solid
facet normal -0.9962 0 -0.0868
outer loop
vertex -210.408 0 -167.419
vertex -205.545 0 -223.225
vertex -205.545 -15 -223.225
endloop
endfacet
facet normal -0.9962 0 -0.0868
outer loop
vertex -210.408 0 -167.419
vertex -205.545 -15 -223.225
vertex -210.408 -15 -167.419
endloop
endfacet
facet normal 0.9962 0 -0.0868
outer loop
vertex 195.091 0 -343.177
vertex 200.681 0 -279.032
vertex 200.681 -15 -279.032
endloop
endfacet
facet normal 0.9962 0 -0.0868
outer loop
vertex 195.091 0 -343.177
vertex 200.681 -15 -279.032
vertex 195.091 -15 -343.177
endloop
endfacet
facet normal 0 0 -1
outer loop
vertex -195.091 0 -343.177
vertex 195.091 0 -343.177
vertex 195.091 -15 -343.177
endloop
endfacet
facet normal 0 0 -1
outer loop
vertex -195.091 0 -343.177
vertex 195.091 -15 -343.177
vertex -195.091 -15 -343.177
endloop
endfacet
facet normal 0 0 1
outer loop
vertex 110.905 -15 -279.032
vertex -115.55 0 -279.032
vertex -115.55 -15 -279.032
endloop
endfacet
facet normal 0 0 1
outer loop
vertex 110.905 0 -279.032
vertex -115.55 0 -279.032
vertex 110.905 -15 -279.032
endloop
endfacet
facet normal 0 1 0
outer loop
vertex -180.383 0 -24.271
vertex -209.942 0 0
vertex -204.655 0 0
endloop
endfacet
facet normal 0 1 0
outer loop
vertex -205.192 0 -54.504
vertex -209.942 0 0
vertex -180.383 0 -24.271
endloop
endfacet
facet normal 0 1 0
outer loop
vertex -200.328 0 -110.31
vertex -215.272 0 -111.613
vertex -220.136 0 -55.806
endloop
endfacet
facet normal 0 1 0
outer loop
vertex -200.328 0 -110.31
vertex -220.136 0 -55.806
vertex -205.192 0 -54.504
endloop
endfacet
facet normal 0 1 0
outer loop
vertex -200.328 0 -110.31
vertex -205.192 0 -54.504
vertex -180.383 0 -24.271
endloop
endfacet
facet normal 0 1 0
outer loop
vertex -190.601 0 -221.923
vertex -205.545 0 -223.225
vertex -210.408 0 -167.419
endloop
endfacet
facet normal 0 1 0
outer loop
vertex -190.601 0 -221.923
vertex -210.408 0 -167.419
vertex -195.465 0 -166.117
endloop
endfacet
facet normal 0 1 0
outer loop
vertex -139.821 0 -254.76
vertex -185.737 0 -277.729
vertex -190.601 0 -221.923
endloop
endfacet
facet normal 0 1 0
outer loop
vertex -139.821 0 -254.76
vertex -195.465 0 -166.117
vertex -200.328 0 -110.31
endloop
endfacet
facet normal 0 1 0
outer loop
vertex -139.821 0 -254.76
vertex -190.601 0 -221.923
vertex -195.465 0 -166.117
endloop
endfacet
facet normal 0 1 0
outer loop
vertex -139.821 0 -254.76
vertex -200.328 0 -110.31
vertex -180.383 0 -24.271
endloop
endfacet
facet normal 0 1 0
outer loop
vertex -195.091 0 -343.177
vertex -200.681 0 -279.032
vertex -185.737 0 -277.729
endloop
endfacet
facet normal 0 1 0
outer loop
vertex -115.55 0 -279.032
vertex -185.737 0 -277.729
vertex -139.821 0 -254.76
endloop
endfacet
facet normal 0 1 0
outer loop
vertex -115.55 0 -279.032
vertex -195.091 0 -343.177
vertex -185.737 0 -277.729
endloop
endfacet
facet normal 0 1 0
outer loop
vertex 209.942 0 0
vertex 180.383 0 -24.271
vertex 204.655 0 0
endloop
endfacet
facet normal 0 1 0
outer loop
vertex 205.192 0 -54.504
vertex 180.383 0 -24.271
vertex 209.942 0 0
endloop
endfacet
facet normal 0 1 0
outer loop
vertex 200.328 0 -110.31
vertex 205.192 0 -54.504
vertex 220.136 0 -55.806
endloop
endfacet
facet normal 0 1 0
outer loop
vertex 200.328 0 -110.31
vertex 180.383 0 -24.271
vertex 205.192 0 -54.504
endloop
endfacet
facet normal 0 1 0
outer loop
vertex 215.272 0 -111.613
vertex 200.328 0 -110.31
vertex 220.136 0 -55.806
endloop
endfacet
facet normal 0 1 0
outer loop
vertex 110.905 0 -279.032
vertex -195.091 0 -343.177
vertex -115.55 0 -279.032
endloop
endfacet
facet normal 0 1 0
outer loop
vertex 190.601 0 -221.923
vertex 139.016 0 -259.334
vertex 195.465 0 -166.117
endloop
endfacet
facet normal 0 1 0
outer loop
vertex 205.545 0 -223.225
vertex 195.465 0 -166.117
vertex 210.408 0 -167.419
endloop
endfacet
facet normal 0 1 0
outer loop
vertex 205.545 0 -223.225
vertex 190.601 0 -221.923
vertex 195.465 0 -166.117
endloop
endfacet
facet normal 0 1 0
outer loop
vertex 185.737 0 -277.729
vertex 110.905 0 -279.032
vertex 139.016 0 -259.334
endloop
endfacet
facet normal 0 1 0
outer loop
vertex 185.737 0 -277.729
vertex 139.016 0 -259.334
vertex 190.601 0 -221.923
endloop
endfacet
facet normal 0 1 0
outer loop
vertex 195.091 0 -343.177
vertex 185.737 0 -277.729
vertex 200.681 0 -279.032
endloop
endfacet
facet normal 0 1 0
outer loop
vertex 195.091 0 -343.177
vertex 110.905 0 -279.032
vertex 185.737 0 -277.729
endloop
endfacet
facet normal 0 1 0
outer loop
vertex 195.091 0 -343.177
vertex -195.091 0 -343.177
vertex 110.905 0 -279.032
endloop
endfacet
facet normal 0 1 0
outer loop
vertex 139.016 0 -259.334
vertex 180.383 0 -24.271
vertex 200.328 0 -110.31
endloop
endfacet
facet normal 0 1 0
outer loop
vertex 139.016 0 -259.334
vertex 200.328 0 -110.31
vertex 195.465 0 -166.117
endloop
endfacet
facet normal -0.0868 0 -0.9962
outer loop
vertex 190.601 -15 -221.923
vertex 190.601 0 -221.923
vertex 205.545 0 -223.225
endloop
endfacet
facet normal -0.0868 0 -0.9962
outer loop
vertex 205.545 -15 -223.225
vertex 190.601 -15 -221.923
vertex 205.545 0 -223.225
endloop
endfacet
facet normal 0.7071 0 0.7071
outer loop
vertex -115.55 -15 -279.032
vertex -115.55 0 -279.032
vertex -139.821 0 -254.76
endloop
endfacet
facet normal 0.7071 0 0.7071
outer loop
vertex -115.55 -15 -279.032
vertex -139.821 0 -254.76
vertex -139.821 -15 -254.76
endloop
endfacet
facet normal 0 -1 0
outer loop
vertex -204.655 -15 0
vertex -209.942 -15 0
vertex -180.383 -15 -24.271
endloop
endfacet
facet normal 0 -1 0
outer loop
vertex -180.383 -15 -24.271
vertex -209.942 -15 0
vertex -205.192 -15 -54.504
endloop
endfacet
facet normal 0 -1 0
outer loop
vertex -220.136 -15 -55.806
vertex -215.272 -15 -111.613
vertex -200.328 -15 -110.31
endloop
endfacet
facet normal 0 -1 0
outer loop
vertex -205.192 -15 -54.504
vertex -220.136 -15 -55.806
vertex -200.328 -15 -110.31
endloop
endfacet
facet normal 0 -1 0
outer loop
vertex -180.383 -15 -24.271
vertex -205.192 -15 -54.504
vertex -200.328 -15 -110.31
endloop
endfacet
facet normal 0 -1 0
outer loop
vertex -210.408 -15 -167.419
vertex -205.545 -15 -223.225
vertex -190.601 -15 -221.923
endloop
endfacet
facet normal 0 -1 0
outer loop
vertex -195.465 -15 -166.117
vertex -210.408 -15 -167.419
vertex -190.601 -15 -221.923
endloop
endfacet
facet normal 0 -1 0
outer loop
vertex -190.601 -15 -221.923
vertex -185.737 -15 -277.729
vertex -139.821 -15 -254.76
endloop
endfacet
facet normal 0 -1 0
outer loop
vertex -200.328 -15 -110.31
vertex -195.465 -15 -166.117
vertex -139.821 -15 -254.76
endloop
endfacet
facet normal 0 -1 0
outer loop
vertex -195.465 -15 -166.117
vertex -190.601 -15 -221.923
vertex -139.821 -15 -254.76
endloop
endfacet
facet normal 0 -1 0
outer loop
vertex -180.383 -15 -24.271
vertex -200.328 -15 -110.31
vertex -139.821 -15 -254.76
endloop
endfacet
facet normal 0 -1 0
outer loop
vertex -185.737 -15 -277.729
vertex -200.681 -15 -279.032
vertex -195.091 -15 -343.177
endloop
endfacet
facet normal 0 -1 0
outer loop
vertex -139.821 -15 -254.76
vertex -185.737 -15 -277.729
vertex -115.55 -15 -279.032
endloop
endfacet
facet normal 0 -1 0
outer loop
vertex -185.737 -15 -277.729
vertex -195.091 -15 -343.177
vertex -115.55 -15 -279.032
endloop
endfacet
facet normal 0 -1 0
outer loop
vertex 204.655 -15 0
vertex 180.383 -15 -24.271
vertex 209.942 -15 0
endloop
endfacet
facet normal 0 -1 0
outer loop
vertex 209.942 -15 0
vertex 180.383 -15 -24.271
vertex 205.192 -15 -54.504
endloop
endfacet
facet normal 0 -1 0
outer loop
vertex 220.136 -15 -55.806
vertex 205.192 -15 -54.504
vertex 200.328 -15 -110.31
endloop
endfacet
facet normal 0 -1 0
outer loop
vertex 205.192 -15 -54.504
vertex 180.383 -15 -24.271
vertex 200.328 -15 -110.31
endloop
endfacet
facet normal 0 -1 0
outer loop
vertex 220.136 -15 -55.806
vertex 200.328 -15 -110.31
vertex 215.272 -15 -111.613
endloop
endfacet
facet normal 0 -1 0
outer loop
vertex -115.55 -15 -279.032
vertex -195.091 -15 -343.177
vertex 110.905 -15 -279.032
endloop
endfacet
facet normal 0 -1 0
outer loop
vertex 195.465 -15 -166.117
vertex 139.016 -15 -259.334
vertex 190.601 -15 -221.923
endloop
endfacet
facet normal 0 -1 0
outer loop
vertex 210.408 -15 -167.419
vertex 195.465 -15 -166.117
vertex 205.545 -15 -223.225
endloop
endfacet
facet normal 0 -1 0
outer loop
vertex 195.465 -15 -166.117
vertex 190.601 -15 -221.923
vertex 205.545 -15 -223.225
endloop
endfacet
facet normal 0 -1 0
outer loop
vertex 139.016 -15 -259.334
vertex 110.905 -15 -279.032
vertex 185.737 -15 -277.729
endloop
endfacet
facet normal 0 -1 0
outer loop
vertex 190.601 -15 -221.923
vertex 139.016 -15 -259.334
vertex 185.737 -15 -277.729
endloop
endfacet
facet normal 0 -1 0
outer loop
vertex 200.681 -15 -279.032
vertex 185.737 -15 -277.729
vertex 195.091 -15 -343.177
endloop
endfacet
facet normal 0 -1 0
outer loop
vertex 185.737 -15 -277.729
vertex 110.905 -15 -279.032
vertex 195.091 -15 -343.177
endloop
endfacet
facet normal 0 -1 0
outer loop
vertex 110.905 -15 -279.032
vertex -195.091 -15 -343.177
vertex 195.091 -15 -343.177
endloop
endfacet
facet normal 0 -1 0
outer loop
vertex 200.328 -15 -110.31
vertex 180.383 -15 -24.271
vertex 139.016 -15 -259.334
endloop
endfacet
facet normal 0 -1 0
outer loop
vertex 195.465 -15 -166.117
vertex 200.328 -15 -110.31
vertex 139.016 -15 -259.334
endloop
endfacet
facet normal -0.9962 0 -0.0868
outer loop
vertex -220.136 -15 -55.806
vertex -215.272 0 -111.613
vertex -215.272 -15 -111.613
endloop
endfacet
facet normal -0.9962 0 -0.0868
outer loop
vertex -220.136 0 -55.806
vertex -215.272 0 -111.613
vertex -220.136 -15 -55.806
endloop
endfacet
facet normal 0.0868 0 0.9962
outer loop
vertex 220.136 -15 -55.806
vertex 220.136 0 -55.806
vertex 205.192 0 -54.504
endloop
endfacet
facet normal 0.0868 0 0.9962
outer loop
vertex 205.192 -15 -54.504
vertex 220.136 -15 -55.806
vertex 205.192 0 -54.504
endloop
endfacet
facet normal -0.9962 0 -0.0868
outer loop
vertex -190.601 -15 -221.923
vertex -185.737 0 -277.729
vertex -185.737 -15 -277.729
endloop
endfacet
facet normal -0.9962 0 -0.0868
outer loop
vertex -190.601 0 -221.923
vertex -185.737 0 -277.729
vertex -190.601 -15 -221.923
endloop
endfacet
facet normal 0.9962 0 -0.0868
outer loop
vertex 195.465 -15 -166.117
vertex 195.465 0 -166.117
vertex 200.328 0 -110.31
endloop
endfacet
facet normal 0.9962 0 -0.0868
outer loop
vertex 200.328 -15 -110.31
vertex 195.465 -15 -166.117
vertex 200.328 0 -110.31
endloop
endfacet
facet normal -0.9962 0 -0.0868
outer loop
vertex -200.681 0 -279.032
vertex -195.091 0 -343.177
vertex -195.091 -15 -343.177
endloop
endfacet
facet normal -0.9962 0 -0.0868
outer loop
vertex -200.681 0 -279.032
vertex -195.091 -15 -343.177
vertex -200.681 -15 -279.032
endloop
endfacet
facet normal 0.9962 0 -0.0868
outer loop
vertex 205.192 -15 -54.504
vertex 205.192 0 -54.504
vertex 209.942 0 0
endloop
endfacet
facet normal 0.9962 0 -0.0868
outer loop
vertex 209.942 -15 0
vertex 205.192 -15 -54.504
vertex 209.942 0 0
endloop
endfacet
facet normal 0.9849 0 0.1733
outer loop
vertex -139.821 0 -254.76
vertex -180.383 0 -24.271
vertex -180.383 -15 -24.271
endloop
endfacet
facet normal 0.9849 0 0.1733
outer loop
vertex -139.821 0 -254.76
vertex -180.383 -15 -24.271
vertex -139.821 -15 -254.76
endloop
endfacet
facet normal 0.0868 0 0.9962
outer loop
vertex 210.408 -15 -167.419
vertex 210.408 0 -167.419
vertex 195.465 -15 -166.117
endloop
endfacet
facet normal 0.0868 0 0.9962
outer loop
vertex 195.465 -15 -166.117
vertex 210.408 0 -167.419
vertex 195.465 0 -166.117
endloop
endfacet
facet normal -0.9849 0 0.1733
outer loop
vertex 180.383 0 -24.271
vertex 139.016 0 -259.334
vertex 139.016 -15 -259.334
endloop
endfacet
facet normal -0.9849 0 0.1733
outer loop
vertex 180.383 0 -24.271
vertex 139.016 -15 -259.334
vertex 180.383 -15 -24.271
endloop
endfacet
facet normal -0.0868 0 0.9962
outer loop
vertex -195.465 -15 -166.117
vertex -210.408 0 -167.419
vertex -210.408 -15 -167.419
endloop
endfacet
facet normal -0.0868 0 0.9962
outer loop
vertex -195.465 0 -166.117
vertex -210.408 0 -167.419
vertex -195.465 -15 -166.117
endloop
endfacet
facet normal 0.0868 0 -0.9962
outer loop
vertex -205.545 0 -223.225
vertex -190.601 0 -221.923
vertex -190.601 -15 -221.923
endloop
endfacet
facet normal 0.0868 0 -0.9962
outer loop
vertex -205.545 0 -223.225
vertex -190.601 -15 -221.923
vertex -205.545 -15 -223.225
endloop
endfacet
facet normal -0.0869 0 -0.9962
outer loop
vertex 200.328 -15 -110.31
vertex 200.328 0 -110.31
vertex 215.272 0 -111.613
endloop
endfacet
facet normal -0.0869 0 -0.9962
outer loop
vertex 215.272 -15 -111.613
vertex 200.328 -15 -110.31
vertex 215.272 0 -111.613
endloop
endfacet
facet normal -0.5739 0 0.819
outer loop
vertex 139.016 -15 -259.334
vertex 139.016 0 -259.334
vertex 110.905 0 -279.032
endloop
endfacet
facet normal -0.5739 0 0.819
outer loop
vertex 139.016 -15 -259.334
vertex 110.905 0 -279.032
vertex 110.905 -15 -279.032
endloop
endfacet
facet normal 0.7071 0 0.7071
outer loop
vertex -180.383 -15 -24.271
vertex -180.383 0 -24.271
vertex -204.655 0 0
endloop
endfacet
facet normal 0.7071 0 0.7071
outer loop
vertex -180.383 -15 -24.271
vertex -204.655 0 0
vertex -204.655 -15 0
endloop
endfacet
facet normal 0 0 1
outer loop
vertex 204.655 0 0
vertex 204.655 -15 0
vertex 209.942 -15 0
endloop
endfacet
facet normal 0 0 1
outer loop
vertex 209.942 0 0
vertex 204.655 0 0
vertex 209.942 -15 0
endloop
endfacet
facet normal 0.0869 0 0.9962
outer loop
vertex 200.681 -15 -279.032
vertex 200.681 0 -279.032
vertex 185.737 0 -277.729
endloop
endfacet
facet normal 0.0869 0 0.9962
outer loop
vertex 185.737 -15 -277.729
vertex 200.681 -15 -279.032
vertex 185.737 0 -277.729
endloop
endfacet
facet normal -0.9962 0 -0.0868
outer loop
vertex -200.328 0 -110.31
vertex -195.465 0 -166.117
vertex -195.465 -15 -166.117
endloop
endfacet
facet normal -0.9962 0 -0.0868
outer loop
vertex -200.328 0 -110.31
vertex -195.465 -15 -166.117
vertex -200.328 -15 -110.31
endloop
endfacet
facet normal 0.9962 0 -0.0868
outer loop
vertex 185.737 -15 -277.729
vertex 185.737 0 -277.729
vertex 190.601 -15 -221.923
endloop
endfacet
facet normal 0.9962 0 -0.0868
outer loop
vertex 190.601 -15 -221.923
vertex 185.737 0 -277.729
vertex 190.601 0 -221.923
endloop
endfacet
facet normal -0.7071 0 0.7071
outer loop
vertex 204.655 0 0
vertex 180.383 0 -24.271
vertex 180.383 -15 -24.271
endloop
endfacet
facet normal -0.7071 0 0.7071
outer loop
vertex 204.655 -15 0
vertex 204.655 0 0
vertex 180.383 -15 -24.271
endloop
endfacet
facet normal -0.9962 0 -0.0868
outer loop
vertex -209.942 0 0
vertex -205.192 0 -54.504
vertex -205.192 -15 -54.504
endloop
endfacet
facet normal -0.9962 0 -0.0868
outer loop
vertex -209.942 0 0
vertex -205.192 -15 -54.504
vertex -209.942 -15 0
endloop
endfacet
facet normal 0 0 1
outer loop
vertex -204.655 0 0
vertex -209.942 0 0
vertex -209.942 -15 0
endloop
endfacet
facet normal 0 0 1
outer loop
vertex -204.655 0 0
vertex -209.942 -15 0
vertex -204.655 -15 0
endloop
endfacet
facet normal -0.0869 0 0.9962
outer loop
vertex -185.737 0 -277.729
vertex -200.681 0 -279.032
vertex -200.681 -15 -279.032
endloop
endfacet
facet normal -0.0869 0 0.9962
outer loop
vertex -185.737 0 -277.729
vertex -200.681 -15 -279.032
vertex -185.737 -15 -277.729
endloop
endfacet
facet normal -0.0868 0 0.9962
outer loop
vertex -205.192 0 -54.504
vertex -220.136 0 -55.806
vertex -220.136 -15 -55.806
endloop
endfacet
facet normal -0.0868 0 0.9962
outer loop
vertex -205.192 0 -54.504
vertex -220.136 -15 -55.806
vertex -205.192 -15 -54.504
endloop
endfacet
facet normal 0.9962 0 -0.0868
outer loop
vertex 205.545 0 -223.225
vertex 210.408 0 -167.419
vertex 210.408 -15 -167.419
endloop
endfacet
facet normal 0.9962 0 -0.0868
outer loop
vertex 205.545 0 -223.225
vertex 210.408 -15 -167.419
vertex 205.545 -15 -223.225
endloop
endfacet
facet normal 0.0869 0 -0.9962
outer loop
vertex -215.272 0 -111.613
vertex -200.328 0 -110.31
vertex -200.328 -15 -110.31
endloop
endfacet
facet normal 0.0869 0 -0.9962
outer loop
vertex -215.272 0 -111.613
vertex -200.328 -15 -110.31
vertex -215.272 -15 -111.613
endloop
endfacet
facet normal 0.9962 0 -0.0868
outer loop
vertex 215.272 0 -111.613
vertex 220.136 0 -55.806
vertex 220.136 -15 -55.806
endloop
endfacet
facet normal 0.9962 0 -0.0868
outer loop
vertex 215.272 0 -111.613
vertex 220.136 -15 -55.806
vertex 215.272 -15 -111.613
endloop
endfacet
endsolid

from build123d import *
from OCP.BRepFilletAPI import BRepFilletAPI_MakeChamfer

# Parameters (mm, degrees)
BOSS_EXTRUDE1_DEPTH = 15
CHAMFER1_SIZE       = 20
CHAMFER1_SIZE2      = 24.644345169
CHAMFER2_SIZE       = 20
CHAMFER2_SIZE2      = 24.644345169
CHAMFER3_SIZE       = 20
CHAMFER3_SIZE2      = 24.644345169
CUT_EXTRUDE1_DEPTH  = 411.634172553


with BuildPart() as part:
    # Sketch2 → Boss-Extrude1 (new body)
    with BuildSketch(Plane(origin=(0, 0, 0), x_dir=(1, 0, 0), z_dir=(0, 1, 0))):
        Polygon((-195.090568581, 343.177241046), (-224.999566436, 0), (-184.654847842, 0), (-135.549804353, 279.031716914), (135.549804353, 279.031716914), (184.654847842, 0), (224.999566436, 0), (195.090568581, 343.177241046), align=None)
    extrude(amount=-BOSS_EXTRUDE1_DEPTH)

    # Chamfer1: one chamfer whose edges measure the first distance from different faces: ONE call of the kernel's chamfer builder (chamfer() names one face for all edges)
    chamfer1_edges_1 = [part.edges().sort_by_distance(p)[0] for p in [
        (135.549804353, -7.5, -279.031716914),
    ]]
    chamfer1_side_1 = [part.faces().sort_by_distance(p)[0] for p in [
        (160.102326098, -7.5, -139.515858457),
    ]]
    chamfer1_edges_2 = [part.edges().sort_by_distance(p)[0] for p in [
        (-135.549804353, -7.5, -279.031716914),
    ]]
    chamfer1_side_2 = [part.faces().sort_by_distance(p)[0] for p in [
        (0, -7.5, -279.031716914),
    ]]
    chamfer1 = BRepFilletAPI_MakeChamfer(part.part.solid().wrapped)
    for e in chamfer1_edges_1:
        chamfer1.Add(CHAMFER1_SIZE, CHAMFER1_SIZE2, e.wrapped, chamfer1_side_1[0].wrapped)  # the first distance lies on this face
    for e in chamfer1_edges_2:
        chamfer1.Add(CHAMFER1_SIZE, CHAMFER1_SIZE2, e.wrapped, chamfer1_side_2[0].wrapped)  # the first distance lies on this face
    add(Compound.cast(chamfer1.Shape()), mode=Mode.REPLACE)

    # Chamfer2
    chamfer2_edges = [part.edges().sort_by_distance(p)[0] for p in [
        (184.654847842, -7.5, 0),
    ]]
    chamfer2_side = [part.faces().sort_by_distance(p)[0] for p in [
        (204.827207139, -7.5, 0),
    ]]
    chamfer(chamfer2_edges, length=CHAMFER2_SIZE, length2=CHAMFER2_SIZE2, reference=chamfer2_side[0])

    # Chamfer3
    chamfer3_edges = [part.edges().sort_by_distance(p)[0] for p in [
        (-184.654847842, -7.5, 0),
    ]]
    chamfer3_side = [part.faces().sort_by_distance(p)[0] for p in [
        (-204.827207139, -7.5, 0),
    ]]
    chamfer(chamfer3_edges, length=CHAMFER3_SIZE, length2=CHAMFER3_SIZE2, reference=chamfer3_side[0])

    # Sketch3 → Cut-Extrude1 (cut, through all)
    with BuildSketch(Plane(origin=(0, 0, 0), x_dir=(1, 0, 0), z_dir=(0, 1, 0))):
        Polygon((200.68105686, 279.031716914), (185.737267566, 277.729317721), (190.600969481, 221.922974338), (205.544758775, 223.225373531), align=None)
        Polygon((210.40846069, 167.419030149), (195.464671397, 166.116630955), (200.328373312, 110.310287572), (215.272162606, 111.612686766), align=None)
        Polygon((209.942268873, 0), (224.999566436, 0), (220.135864521, 55.806343383), (205.192075227, 54.503944189), align=None)
    cut_extrude1 = extrude(amount=-CUT_EXTRUDE1_DEPTH, mode=Mode.SUBTRACT)

    # Mirror1: Cut-Extrude1 across plane
    add(cut_extrude1.mirror(Plane(origin=(0, 0, 0), x_dir=(0, 0, 1), z_dir=(1, 0, 0))), mode=Mode.SUBTRACT)


solid = part.part
